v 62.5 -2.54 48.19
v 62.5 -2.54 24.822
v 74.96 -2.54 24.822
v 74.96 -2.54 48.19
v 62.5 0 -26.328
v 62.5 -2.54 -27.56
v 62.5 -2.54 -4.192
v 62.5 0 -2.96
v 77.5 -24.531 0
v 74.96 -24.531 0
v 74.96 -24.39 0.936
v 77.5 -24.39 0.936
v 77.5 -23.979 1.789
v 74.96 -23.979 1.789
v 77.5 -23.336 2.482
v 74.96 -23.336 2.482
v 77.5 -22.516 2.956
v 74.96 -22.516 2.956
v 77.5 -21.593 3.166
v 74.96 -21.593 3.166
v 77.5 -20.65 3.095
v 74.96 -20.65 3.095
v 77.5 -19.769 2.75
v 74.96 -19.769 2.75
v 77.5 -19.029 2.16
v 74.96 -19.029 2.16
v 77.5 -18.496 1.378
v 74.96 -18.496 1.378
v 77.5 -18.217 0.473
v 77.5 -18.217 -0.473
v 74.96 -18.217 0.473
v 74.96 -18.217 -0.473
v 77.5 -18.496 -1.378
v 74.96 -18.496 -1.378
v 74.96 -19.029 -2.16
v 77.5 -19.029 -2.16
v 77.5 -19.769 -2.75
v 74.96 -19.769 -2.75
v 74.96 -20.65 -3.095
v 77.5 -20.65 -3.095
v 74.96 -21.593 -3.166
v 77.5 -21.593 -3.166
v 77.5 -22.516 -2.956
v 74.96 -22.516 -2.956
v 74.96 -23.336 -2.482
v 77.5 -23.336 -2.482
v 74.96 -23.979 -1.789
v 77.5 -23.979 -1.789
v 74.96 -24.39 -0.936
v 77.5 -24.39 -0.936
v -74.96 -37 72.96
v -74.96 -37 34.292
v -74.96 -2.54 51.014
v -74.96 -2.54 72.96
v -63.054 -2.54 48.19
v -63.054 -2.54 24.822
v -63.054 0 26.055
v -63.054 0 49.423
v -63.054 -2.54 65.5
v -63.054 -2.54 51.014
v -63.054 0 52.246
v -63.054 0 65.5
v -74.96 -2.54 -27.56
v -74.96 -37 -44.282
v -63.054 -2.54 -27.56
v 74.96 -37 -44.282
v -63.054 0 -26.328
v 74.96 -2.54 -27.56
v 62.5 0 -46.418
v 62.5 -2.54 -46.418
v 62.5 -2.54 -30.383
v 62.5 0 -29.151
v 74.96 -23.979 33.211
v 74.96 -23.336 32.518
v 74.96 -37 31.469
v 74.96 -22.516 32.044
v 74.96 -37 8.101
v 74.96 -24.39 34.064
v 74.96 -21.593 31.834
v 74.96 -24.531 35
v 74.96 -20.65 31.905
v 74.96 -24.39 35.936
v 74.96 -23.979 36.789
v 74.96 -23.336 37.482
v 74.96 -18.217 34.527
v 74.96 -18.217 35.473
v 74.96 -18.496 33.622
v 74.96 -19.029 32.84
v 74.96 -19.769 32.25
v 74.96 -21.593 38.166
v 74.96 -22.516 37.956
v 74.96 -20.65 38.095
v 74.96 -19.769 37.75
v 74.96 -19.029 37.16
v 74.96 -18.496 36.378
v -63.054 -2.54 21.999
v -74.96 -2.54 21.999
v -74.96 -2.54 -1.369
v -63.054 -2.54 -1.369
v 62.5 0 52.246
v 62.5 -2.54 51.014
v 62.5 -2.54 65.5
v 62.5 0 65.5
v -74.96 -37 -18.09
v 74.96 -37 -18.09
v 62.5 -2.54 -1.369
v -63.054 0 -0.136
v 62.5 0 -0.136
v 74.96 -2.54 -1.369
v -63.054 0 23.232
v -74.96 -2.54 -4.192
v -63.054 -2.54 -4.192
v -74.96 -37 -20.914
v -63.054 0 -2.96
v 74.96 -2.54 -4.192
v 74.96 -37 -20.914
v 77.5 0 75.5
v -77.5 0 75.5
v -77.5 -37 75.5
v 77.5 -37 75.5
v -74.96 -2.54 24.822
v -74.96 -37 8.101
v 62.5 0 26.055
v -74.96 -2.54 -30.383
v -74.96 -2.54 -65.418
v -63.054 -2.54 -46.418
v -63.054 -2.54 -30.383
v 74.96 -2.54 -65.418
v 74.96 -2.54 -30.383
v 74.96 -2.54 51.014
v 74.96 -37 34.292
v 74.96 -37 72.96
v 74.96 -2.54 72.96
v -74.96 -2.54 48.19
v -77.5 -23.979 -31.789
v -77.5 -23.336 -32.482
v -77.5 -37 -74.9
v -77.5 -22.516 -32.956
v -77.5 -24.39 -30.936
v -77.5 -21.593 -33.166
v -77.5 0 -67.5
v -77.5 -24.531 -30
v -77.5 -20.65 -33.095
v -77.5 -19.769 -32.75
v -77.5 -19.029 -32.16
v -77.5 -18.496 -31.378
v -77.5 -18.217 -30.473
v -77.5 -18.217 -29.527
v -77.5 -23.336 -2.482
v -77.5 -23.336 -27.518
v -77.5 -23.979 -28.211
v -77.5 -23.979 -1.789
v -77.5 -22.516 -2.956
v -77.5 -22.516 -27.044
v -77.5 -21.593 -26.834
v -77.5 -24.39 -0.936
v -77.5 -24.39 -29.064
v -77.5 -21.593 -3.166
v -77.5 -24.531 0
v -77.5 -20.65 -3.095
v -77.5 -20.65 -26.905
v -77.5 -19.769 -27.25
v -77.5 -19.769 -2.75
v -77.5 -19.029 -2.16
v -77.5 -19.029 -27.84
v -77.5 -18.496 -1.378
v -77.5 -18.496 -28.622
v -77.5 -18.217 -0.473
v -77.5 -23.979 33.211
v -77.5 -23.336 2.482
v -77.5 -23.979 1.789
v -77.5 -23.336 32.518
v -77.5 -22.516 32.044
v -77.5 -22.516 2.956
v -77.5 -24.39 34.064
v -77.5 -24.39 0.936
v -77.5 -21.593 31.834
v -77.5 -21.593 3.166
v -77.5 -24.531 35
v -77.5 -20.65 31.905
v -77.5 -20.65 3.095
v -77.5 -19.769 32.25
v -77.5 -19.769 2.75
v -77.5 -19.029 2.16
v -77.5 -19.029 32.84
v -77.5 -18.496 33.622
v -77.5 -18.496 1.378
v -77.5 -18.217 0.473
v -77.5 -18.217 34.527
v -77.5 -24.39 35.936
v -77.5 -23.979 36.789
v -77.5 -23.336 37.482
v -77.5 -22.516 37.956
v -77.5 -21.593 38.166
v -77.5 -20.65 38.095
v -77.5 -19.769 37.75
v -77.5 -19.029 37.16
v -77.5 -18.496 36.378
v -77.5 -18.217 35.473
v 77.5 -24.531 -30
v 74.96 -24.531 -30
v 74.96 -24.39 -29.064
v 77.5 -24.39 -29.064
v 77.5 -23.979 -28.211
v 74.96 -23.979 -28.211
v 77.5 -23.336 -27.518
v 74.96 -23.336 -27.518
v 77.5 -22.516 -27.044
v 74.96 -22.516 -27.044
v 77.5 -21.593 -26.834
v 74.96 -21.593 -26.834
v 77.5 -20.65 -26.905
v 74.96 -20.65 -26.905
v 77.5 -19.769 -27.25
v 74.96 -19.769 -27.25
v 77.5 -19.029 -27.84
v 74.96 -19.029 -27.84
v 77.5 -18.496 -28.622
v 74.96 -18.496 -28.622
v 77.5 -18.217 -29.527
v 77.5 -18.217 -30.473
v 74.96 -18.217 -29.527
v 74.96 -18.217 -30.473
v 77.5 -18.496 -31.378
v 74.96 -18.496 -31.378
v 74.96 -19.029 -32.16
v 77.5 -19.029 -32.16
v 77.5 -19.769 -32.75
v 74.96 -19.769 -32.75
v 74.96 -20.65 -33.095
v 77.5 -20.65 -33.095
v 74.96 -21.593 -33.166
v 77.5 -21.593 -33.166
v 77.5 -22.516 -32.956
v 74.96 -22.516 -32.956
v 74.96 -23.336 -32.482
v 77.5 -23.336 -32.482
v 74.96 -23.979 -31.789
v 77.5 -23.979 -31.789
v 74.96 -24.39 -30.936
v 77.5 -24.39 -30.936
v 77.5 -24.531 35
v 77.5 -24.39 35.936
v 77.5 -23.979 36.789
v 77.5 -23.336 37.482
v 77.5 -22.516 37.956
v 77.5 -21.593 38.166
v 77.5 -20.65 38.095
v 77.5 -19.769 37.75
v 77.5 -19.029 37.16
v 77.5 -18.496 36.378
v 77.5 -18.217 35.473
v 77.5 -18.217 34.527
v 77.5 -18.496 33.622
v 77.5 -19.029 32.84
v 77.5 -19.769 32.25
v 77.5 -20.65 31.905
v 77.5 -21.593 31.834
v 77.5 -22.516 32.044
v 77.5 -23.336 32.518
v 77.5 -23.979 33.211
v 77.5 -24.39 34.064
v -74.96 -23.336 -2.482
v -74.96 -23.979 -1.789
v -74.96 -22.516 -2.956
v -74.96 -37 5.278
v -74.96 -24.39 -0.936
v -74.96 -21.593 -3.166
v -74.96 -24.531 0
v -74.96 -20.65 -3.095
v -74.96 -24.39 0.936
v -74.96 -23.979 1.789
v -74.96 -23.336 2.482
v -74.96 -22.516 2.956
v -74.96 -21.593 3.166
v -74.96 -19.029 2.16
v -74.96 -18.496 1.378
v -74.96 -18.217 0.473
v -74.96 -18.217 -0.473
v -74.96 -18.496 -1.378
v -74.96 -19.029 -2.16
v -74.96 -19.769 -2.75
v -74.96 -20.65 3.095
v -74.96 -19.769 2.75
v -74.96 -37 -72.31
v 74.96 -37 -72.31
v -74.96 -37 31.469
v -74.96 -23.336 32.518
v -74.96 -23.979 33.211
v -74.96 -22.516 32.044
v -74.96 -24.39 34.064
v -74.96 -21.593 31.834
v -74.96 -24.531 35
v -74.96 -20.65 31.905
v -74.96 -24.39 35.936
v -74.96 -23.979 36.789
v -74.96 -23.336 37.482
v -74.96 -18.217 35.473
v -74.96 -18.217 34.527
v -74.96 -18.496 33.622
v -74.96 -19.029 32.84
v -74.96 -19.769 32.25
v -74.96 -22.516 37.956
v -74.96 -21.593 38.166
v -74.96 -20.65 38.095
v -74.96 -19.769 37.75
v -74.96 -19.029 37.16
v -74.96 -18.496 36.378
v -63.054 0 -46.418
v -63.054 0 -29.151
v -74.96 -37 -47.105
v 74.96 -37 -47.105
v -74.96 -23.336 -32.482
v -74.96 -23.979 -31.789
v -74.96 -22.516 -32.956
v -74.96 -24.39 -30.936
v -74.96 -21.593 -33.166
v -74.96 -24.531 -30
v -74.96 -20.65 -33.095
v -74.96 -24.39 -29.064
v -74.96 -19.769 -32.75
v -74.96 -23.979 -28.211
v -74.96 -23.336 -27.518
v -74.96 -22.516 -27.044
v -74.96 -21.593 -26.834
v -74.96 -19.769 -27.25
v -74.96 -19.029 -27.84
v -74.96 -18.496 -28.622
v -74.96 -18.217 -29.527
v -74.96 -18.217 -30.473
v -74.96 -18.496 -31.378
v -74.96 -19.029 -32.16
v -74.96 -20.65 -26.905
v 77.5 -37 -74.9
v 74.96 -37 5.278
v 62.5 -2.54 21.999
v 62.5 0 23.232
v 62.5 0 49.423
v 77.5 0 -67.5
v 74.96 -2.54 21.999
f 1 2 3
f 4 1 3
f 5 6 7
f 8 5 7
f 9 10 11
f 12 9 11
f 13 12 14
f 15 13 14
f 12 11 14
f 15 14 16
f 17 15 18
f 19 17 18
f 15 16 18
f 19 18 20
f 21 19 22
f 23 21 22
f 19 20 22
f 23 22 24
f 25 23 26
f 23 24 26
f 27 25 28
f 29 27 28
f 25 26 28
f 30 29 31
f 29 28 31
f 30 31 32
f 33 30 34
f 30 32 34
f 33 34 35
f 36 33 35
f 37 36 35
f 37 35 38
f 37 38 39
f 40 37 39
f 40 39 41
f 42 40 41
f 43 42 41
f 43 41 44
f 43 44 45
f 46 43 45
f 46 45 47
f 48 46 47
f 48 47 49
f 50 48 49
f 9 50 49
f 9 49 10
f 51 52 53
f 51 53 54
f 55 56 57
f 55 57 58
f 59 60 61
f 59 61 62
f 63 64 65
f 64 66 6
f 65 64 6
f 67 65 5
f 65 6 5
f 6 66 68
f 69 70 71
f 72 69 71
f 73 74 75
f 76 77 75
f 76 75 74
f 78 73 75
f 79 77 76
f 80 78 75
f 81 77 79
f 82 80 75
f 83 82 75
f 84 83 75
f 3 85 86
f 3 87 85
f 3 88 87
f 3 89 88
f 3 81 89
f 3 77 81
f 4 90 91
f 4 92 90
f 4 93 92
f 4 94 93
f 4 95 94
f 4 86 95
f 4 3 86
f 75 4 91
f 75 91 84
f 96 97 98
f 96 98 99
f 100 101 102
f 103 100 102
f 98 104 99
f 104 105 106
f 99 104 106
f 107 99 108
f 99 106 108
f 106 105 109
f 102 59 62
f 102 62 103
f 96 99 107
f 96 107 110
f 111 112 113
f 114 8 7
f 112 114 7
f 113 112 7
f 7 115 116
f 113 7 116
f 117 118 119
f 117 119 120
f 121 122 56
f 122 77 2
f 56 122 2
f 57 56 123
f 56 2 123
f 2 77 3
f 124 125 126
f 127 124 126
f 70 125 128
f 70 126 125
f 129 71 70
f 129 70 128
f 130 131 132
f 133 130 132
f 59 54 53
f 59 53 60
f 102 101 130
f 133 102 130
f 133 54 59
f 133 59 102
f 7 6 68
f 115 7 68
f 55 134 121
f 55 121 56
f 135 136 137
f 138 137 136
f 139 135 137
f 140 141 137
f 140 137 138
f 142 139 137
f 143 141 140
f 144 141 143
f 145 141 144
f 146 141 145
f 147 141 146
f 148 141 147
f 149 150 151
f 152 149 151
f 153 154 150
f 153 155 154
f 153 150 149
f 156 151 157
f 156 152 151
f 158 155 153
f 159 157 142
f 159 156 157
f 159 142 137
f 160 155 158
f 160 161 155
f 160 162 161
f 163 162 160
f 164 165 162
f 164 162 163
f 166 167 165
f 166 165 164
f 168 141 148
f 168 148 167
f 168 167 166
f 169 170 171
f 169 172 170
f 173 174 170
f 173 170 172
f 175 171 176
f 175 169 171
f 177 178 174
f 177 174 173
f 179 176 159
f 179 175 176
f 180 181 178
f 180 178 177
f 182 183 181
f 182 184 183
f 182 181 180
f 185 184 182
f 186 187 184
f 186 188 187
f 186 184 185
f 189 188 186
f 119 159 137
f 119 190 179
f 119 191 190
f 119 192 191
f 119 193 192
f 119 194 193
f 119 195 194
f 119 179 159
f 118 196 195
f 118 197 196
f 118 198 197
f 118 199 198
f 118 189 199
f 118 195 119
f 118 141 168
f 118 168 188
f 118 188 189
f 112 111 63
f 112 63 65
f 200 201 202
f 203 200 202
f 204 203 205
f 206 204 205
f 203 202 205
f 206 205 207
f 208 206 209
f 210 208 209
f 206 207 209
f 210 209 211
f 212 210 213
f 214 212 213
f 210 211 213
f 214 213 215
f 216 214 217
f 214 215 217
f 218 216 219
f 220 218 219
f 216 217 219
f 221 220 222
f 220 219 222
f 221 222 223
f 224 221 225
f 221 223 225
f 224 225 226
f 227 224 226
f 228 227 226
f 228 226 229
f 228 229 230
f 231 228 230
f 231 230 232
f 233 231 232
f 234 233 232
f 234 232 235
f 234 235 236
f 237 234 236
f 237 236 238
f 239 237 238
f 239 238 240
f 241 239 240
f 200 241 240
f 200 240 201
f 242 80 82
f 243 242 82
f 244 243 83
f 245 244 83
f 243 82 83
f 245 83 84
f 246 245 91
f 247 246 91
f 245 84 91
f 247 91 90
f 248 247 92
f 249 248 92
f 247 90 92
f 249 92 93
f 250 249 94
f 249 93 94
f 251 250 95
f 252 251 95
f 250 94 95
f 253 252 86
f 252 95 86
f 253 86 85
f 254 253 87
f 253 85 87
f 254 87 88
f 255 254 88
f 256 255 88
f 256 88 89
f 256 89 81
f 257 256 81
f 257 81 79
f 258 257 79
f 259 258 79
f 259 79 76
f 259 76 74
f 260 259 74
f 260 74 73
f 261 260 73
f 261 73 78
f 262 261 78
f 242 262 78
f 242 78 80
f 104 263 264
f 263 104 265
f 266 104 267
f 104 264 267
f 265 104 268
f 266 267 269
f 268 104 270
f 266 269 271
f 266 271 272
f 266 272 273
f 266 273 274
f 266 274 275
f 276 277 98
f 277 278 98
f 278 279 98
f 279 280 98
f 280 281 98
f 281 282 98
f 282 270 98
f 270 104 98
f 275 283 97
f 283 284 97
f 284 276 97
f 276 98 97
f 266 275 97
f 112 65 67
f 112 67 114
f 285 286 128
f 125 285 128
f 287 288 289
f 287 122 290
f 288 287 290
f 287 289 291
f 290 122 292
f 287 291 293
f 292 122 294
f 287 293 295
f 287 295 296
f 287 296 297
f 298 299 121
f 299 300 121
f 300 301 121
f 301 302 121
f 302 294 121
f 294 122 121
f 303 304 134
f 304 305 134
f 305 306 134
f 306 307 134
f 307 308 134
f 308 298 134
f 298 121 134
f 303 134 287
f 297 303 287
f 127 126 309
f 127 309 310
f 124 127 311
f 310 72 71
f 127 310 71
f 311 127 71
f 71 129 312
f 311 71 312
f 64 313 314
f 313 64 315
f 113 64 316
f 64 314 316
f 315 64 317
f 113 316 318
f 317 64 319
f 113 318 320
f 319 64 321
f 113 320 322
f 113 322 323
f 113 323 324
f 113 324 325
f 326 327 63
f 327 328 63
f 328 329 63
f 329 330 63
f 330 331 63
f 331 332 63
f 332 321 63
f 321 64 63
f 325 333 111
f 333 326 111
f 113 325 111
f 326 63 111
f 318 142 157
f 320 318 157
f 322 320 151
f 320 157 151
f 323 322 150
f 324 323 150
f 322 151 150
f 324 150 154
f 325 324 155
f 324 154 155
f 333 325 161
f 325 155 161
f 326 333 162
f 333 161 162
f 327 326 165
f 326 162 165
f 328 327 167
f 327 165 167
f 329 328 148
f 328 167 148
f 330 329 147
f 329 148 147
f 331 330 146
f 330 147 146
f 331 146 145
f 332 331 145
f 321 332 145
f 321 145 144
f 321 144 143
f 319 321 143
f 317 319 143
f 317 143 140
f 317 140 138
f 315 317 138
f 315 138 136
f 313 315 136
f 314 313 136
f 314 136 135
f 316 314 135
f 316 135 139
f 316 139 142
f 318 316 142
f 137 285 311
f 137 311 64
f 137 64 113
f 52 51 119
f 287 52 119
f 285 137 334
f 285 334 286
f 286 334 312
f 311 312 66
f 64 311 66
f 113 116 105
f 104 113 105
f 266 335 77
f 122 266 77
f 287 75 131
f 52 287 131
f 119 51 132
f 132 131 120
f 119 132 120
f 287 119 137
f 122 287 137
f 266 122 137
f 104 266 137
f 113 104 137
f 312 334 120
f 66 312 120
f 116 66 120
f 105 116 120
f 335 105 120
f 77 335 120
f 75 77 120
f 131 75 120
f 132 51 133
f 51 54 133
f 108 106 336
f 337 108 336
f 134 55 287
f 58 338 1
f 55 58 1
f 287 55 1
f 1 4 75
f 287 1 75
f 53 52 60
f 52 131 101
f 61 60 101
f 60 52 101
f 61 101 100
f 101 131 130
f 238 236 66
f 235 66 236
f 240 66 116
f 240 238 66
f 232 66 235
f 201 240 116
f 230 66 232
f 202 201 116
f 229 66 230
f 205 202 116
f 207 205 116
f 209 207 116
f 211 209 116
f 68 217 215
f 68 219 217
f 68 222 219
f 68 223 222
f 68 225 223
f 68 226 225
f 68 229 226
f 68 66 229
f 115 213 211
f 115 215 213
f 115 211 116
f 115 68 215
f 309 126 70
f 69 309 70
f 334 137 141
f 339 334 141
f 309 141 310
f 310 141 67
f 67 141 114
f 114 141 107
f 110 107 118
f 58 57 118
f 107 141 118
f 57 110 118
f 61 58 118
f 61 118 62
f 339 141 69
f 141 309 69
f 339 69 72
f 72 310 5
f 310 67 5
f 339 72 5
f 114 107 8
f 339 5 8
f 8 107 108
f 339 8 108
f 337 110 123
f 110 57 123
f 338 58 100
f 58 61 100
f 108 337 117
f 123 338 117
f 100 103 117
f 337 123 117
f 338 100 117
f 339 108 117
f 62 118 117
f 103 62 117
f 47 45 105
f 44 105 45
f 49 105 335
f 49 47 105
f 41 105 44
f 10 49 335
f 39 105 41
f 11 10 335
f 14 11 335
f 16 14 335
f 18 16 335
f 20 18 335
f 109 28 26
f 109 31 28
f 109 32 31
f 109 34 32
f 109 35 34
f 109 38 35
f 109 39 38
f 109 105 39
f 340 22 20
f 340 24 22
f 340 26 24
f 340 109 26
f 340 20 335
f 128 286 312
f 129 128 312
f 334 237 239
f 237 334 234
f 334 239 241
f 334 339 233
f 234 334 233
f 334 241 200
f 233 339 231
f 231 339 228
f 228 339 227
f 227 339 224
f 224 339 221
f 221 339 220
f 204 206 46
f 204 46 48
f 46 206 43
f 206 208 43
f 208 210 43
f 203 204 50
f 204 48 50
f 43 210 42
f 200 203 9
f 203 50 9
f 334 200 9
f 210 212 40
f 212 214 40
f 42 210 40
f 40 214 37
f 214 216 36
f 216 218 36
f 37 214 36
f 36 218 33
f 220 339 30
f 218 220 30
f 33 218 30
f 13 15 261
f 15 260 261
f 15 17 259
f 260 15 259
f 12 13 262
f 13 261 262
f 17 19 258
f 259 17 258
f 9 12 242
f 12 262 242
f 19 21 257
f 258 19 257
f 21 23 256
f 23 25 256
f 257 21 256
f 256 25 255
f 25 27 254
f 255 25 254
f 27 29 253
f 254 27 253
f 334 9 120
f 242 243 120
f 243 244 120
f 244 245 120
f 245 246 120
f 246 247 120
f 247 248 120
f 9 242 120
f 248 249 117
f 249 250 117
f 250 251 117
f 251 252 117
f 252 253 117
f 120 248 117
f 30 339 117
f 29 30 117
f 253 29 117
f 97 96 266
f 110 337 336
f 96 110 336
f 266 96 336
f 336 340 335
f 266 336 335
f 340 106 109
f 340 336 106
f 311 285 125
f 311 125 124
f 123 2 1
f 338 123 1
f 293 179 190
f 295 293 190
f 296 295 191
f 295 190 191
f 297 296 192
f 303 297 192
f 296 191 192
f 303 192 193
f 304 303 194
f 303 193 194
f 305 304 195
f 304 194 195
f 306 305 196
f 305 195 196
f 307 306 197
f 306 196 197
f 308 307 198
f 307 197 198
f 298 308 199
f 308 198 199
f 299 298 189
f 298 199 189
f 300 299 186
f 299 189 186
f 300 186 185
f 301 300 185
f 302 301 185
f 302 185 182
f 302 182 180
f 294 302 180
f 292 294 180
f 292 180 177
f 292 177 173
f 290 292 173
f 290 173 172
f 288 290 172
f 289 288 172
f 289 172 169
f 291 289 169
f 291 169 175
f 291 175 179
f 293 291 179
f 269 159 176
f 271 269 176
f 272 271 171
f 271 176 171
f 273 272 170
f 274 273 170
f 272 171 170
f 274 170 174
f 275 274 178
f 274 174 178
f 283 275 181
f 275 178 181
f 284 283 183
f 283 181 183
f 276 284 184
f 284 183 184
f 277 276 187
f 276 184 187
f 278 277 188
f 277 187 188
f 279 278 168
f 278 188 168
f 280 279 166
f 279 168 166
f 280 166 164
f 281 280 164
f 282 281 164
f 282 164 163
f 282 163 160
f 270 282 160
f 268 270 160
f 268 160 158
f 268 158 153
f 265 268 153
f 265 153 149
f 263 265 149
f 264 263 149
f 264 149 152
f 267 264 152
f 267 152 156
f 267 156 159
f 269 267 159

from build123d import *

# Parameters (mm, degrees)
F0_W        = 155
F0_H        = 151
F1_DEPTH    = 37
F2_T1_DEPTH = 362.8505669038
F3_T        = -2.54
F4_W        = 125.55387271
F4_H        = 111.9176980871
F5_DEPTH    = 25.4
F6_R        = 3.175
F7_DEPTH    = 155.001
F9_DEPTH    = 152.46


# Not quite as in the source:
# - a fillet or chamfer that OpenCascade refuses, or shapes differently, is made with other operations: its cross-section is extruded or revolved along the edge and cut away or added


with BuildPart() as f1:
    # F0 (on Front) → F1 (new body)
    with BuildSketch(Plane.XZ):
        Rectangle(F0_W, F0_H)
    extrude(amount=F1_DEPTH)

    # F2: chamfer of 40 x 8 on 1 edges, made by hand

    # F2_s2 → F2_t1 (cut)
    with BuildSketch(Plane.YZ.offset(-181.4252834519)):
        Polygon((-40, -75.5), (0, -67.5), (0, -75.5), align=None)
    extrude(amount=F2_T1_DEPTH, mode=Mode.SUBTRACT)

    # F3
    f3_openings = [f1.faces().sort_by_distance(p)[0] for p in [
        (0, -37, 0.3),
    ]]
    offset(amount=F3_T, openings=f3_openings)

    # F4 (on face) → F5 (cut)
    with BuildSketch(Plane.XZ.offset(2.54)):
        with Locations((-0.276936355, 9.5411509565)):
            Rectangle(F4_W, F4_H)
    extrude(amount=-F5_DEPTH, mode=Mode.SUBTRACT)

    # F6 (on face) → F7 (cut, through all)
    with BuildSketch(Plane(origin=(-77.5, 0, 0), x_dir=(0, -1, 0), z_dir=(-1, 0, 0))):
        with Locations((21.3561020792, 0)):
            Circle(F6_R)
        with Locations((21.3561020792, 35)):
            Circle(F6_R)
        with Locations((21.3561020792, -30)):
            Circle(F6_R)
    extrude(amount=-F7_DEPTH, mode=Mode.SUBTRACT)

    # F8 (on face) → F9 (join, through all)
    with BuildSketch(Plane(origin=(74.96, 0, 0), x_dir=(0, -1, 0), z_dir=(-1, 0, 0))):
        Polygon((0, -29.1507557497), (37, -47.1048012634), (37, -44.281557044), (0, -26.3275115302), align=None)
        Polygon((0, -2.9595115302), (37, -20.913557044), (37, -18.0903128246), (0, -0.1362673108), align=None)
        Polygon((0, 23.2317326892), (37, 5.2776871754), (37, 8.1009313948), (0, 26.0549769086), align=None)
        Polygon((0, 49.4229769086), (37, 31.4689313948), (37, 34.2921756143), (0, 52.246221128), align=None)
    extrude(amount=F9_DEPTH)


solid = f1.part
